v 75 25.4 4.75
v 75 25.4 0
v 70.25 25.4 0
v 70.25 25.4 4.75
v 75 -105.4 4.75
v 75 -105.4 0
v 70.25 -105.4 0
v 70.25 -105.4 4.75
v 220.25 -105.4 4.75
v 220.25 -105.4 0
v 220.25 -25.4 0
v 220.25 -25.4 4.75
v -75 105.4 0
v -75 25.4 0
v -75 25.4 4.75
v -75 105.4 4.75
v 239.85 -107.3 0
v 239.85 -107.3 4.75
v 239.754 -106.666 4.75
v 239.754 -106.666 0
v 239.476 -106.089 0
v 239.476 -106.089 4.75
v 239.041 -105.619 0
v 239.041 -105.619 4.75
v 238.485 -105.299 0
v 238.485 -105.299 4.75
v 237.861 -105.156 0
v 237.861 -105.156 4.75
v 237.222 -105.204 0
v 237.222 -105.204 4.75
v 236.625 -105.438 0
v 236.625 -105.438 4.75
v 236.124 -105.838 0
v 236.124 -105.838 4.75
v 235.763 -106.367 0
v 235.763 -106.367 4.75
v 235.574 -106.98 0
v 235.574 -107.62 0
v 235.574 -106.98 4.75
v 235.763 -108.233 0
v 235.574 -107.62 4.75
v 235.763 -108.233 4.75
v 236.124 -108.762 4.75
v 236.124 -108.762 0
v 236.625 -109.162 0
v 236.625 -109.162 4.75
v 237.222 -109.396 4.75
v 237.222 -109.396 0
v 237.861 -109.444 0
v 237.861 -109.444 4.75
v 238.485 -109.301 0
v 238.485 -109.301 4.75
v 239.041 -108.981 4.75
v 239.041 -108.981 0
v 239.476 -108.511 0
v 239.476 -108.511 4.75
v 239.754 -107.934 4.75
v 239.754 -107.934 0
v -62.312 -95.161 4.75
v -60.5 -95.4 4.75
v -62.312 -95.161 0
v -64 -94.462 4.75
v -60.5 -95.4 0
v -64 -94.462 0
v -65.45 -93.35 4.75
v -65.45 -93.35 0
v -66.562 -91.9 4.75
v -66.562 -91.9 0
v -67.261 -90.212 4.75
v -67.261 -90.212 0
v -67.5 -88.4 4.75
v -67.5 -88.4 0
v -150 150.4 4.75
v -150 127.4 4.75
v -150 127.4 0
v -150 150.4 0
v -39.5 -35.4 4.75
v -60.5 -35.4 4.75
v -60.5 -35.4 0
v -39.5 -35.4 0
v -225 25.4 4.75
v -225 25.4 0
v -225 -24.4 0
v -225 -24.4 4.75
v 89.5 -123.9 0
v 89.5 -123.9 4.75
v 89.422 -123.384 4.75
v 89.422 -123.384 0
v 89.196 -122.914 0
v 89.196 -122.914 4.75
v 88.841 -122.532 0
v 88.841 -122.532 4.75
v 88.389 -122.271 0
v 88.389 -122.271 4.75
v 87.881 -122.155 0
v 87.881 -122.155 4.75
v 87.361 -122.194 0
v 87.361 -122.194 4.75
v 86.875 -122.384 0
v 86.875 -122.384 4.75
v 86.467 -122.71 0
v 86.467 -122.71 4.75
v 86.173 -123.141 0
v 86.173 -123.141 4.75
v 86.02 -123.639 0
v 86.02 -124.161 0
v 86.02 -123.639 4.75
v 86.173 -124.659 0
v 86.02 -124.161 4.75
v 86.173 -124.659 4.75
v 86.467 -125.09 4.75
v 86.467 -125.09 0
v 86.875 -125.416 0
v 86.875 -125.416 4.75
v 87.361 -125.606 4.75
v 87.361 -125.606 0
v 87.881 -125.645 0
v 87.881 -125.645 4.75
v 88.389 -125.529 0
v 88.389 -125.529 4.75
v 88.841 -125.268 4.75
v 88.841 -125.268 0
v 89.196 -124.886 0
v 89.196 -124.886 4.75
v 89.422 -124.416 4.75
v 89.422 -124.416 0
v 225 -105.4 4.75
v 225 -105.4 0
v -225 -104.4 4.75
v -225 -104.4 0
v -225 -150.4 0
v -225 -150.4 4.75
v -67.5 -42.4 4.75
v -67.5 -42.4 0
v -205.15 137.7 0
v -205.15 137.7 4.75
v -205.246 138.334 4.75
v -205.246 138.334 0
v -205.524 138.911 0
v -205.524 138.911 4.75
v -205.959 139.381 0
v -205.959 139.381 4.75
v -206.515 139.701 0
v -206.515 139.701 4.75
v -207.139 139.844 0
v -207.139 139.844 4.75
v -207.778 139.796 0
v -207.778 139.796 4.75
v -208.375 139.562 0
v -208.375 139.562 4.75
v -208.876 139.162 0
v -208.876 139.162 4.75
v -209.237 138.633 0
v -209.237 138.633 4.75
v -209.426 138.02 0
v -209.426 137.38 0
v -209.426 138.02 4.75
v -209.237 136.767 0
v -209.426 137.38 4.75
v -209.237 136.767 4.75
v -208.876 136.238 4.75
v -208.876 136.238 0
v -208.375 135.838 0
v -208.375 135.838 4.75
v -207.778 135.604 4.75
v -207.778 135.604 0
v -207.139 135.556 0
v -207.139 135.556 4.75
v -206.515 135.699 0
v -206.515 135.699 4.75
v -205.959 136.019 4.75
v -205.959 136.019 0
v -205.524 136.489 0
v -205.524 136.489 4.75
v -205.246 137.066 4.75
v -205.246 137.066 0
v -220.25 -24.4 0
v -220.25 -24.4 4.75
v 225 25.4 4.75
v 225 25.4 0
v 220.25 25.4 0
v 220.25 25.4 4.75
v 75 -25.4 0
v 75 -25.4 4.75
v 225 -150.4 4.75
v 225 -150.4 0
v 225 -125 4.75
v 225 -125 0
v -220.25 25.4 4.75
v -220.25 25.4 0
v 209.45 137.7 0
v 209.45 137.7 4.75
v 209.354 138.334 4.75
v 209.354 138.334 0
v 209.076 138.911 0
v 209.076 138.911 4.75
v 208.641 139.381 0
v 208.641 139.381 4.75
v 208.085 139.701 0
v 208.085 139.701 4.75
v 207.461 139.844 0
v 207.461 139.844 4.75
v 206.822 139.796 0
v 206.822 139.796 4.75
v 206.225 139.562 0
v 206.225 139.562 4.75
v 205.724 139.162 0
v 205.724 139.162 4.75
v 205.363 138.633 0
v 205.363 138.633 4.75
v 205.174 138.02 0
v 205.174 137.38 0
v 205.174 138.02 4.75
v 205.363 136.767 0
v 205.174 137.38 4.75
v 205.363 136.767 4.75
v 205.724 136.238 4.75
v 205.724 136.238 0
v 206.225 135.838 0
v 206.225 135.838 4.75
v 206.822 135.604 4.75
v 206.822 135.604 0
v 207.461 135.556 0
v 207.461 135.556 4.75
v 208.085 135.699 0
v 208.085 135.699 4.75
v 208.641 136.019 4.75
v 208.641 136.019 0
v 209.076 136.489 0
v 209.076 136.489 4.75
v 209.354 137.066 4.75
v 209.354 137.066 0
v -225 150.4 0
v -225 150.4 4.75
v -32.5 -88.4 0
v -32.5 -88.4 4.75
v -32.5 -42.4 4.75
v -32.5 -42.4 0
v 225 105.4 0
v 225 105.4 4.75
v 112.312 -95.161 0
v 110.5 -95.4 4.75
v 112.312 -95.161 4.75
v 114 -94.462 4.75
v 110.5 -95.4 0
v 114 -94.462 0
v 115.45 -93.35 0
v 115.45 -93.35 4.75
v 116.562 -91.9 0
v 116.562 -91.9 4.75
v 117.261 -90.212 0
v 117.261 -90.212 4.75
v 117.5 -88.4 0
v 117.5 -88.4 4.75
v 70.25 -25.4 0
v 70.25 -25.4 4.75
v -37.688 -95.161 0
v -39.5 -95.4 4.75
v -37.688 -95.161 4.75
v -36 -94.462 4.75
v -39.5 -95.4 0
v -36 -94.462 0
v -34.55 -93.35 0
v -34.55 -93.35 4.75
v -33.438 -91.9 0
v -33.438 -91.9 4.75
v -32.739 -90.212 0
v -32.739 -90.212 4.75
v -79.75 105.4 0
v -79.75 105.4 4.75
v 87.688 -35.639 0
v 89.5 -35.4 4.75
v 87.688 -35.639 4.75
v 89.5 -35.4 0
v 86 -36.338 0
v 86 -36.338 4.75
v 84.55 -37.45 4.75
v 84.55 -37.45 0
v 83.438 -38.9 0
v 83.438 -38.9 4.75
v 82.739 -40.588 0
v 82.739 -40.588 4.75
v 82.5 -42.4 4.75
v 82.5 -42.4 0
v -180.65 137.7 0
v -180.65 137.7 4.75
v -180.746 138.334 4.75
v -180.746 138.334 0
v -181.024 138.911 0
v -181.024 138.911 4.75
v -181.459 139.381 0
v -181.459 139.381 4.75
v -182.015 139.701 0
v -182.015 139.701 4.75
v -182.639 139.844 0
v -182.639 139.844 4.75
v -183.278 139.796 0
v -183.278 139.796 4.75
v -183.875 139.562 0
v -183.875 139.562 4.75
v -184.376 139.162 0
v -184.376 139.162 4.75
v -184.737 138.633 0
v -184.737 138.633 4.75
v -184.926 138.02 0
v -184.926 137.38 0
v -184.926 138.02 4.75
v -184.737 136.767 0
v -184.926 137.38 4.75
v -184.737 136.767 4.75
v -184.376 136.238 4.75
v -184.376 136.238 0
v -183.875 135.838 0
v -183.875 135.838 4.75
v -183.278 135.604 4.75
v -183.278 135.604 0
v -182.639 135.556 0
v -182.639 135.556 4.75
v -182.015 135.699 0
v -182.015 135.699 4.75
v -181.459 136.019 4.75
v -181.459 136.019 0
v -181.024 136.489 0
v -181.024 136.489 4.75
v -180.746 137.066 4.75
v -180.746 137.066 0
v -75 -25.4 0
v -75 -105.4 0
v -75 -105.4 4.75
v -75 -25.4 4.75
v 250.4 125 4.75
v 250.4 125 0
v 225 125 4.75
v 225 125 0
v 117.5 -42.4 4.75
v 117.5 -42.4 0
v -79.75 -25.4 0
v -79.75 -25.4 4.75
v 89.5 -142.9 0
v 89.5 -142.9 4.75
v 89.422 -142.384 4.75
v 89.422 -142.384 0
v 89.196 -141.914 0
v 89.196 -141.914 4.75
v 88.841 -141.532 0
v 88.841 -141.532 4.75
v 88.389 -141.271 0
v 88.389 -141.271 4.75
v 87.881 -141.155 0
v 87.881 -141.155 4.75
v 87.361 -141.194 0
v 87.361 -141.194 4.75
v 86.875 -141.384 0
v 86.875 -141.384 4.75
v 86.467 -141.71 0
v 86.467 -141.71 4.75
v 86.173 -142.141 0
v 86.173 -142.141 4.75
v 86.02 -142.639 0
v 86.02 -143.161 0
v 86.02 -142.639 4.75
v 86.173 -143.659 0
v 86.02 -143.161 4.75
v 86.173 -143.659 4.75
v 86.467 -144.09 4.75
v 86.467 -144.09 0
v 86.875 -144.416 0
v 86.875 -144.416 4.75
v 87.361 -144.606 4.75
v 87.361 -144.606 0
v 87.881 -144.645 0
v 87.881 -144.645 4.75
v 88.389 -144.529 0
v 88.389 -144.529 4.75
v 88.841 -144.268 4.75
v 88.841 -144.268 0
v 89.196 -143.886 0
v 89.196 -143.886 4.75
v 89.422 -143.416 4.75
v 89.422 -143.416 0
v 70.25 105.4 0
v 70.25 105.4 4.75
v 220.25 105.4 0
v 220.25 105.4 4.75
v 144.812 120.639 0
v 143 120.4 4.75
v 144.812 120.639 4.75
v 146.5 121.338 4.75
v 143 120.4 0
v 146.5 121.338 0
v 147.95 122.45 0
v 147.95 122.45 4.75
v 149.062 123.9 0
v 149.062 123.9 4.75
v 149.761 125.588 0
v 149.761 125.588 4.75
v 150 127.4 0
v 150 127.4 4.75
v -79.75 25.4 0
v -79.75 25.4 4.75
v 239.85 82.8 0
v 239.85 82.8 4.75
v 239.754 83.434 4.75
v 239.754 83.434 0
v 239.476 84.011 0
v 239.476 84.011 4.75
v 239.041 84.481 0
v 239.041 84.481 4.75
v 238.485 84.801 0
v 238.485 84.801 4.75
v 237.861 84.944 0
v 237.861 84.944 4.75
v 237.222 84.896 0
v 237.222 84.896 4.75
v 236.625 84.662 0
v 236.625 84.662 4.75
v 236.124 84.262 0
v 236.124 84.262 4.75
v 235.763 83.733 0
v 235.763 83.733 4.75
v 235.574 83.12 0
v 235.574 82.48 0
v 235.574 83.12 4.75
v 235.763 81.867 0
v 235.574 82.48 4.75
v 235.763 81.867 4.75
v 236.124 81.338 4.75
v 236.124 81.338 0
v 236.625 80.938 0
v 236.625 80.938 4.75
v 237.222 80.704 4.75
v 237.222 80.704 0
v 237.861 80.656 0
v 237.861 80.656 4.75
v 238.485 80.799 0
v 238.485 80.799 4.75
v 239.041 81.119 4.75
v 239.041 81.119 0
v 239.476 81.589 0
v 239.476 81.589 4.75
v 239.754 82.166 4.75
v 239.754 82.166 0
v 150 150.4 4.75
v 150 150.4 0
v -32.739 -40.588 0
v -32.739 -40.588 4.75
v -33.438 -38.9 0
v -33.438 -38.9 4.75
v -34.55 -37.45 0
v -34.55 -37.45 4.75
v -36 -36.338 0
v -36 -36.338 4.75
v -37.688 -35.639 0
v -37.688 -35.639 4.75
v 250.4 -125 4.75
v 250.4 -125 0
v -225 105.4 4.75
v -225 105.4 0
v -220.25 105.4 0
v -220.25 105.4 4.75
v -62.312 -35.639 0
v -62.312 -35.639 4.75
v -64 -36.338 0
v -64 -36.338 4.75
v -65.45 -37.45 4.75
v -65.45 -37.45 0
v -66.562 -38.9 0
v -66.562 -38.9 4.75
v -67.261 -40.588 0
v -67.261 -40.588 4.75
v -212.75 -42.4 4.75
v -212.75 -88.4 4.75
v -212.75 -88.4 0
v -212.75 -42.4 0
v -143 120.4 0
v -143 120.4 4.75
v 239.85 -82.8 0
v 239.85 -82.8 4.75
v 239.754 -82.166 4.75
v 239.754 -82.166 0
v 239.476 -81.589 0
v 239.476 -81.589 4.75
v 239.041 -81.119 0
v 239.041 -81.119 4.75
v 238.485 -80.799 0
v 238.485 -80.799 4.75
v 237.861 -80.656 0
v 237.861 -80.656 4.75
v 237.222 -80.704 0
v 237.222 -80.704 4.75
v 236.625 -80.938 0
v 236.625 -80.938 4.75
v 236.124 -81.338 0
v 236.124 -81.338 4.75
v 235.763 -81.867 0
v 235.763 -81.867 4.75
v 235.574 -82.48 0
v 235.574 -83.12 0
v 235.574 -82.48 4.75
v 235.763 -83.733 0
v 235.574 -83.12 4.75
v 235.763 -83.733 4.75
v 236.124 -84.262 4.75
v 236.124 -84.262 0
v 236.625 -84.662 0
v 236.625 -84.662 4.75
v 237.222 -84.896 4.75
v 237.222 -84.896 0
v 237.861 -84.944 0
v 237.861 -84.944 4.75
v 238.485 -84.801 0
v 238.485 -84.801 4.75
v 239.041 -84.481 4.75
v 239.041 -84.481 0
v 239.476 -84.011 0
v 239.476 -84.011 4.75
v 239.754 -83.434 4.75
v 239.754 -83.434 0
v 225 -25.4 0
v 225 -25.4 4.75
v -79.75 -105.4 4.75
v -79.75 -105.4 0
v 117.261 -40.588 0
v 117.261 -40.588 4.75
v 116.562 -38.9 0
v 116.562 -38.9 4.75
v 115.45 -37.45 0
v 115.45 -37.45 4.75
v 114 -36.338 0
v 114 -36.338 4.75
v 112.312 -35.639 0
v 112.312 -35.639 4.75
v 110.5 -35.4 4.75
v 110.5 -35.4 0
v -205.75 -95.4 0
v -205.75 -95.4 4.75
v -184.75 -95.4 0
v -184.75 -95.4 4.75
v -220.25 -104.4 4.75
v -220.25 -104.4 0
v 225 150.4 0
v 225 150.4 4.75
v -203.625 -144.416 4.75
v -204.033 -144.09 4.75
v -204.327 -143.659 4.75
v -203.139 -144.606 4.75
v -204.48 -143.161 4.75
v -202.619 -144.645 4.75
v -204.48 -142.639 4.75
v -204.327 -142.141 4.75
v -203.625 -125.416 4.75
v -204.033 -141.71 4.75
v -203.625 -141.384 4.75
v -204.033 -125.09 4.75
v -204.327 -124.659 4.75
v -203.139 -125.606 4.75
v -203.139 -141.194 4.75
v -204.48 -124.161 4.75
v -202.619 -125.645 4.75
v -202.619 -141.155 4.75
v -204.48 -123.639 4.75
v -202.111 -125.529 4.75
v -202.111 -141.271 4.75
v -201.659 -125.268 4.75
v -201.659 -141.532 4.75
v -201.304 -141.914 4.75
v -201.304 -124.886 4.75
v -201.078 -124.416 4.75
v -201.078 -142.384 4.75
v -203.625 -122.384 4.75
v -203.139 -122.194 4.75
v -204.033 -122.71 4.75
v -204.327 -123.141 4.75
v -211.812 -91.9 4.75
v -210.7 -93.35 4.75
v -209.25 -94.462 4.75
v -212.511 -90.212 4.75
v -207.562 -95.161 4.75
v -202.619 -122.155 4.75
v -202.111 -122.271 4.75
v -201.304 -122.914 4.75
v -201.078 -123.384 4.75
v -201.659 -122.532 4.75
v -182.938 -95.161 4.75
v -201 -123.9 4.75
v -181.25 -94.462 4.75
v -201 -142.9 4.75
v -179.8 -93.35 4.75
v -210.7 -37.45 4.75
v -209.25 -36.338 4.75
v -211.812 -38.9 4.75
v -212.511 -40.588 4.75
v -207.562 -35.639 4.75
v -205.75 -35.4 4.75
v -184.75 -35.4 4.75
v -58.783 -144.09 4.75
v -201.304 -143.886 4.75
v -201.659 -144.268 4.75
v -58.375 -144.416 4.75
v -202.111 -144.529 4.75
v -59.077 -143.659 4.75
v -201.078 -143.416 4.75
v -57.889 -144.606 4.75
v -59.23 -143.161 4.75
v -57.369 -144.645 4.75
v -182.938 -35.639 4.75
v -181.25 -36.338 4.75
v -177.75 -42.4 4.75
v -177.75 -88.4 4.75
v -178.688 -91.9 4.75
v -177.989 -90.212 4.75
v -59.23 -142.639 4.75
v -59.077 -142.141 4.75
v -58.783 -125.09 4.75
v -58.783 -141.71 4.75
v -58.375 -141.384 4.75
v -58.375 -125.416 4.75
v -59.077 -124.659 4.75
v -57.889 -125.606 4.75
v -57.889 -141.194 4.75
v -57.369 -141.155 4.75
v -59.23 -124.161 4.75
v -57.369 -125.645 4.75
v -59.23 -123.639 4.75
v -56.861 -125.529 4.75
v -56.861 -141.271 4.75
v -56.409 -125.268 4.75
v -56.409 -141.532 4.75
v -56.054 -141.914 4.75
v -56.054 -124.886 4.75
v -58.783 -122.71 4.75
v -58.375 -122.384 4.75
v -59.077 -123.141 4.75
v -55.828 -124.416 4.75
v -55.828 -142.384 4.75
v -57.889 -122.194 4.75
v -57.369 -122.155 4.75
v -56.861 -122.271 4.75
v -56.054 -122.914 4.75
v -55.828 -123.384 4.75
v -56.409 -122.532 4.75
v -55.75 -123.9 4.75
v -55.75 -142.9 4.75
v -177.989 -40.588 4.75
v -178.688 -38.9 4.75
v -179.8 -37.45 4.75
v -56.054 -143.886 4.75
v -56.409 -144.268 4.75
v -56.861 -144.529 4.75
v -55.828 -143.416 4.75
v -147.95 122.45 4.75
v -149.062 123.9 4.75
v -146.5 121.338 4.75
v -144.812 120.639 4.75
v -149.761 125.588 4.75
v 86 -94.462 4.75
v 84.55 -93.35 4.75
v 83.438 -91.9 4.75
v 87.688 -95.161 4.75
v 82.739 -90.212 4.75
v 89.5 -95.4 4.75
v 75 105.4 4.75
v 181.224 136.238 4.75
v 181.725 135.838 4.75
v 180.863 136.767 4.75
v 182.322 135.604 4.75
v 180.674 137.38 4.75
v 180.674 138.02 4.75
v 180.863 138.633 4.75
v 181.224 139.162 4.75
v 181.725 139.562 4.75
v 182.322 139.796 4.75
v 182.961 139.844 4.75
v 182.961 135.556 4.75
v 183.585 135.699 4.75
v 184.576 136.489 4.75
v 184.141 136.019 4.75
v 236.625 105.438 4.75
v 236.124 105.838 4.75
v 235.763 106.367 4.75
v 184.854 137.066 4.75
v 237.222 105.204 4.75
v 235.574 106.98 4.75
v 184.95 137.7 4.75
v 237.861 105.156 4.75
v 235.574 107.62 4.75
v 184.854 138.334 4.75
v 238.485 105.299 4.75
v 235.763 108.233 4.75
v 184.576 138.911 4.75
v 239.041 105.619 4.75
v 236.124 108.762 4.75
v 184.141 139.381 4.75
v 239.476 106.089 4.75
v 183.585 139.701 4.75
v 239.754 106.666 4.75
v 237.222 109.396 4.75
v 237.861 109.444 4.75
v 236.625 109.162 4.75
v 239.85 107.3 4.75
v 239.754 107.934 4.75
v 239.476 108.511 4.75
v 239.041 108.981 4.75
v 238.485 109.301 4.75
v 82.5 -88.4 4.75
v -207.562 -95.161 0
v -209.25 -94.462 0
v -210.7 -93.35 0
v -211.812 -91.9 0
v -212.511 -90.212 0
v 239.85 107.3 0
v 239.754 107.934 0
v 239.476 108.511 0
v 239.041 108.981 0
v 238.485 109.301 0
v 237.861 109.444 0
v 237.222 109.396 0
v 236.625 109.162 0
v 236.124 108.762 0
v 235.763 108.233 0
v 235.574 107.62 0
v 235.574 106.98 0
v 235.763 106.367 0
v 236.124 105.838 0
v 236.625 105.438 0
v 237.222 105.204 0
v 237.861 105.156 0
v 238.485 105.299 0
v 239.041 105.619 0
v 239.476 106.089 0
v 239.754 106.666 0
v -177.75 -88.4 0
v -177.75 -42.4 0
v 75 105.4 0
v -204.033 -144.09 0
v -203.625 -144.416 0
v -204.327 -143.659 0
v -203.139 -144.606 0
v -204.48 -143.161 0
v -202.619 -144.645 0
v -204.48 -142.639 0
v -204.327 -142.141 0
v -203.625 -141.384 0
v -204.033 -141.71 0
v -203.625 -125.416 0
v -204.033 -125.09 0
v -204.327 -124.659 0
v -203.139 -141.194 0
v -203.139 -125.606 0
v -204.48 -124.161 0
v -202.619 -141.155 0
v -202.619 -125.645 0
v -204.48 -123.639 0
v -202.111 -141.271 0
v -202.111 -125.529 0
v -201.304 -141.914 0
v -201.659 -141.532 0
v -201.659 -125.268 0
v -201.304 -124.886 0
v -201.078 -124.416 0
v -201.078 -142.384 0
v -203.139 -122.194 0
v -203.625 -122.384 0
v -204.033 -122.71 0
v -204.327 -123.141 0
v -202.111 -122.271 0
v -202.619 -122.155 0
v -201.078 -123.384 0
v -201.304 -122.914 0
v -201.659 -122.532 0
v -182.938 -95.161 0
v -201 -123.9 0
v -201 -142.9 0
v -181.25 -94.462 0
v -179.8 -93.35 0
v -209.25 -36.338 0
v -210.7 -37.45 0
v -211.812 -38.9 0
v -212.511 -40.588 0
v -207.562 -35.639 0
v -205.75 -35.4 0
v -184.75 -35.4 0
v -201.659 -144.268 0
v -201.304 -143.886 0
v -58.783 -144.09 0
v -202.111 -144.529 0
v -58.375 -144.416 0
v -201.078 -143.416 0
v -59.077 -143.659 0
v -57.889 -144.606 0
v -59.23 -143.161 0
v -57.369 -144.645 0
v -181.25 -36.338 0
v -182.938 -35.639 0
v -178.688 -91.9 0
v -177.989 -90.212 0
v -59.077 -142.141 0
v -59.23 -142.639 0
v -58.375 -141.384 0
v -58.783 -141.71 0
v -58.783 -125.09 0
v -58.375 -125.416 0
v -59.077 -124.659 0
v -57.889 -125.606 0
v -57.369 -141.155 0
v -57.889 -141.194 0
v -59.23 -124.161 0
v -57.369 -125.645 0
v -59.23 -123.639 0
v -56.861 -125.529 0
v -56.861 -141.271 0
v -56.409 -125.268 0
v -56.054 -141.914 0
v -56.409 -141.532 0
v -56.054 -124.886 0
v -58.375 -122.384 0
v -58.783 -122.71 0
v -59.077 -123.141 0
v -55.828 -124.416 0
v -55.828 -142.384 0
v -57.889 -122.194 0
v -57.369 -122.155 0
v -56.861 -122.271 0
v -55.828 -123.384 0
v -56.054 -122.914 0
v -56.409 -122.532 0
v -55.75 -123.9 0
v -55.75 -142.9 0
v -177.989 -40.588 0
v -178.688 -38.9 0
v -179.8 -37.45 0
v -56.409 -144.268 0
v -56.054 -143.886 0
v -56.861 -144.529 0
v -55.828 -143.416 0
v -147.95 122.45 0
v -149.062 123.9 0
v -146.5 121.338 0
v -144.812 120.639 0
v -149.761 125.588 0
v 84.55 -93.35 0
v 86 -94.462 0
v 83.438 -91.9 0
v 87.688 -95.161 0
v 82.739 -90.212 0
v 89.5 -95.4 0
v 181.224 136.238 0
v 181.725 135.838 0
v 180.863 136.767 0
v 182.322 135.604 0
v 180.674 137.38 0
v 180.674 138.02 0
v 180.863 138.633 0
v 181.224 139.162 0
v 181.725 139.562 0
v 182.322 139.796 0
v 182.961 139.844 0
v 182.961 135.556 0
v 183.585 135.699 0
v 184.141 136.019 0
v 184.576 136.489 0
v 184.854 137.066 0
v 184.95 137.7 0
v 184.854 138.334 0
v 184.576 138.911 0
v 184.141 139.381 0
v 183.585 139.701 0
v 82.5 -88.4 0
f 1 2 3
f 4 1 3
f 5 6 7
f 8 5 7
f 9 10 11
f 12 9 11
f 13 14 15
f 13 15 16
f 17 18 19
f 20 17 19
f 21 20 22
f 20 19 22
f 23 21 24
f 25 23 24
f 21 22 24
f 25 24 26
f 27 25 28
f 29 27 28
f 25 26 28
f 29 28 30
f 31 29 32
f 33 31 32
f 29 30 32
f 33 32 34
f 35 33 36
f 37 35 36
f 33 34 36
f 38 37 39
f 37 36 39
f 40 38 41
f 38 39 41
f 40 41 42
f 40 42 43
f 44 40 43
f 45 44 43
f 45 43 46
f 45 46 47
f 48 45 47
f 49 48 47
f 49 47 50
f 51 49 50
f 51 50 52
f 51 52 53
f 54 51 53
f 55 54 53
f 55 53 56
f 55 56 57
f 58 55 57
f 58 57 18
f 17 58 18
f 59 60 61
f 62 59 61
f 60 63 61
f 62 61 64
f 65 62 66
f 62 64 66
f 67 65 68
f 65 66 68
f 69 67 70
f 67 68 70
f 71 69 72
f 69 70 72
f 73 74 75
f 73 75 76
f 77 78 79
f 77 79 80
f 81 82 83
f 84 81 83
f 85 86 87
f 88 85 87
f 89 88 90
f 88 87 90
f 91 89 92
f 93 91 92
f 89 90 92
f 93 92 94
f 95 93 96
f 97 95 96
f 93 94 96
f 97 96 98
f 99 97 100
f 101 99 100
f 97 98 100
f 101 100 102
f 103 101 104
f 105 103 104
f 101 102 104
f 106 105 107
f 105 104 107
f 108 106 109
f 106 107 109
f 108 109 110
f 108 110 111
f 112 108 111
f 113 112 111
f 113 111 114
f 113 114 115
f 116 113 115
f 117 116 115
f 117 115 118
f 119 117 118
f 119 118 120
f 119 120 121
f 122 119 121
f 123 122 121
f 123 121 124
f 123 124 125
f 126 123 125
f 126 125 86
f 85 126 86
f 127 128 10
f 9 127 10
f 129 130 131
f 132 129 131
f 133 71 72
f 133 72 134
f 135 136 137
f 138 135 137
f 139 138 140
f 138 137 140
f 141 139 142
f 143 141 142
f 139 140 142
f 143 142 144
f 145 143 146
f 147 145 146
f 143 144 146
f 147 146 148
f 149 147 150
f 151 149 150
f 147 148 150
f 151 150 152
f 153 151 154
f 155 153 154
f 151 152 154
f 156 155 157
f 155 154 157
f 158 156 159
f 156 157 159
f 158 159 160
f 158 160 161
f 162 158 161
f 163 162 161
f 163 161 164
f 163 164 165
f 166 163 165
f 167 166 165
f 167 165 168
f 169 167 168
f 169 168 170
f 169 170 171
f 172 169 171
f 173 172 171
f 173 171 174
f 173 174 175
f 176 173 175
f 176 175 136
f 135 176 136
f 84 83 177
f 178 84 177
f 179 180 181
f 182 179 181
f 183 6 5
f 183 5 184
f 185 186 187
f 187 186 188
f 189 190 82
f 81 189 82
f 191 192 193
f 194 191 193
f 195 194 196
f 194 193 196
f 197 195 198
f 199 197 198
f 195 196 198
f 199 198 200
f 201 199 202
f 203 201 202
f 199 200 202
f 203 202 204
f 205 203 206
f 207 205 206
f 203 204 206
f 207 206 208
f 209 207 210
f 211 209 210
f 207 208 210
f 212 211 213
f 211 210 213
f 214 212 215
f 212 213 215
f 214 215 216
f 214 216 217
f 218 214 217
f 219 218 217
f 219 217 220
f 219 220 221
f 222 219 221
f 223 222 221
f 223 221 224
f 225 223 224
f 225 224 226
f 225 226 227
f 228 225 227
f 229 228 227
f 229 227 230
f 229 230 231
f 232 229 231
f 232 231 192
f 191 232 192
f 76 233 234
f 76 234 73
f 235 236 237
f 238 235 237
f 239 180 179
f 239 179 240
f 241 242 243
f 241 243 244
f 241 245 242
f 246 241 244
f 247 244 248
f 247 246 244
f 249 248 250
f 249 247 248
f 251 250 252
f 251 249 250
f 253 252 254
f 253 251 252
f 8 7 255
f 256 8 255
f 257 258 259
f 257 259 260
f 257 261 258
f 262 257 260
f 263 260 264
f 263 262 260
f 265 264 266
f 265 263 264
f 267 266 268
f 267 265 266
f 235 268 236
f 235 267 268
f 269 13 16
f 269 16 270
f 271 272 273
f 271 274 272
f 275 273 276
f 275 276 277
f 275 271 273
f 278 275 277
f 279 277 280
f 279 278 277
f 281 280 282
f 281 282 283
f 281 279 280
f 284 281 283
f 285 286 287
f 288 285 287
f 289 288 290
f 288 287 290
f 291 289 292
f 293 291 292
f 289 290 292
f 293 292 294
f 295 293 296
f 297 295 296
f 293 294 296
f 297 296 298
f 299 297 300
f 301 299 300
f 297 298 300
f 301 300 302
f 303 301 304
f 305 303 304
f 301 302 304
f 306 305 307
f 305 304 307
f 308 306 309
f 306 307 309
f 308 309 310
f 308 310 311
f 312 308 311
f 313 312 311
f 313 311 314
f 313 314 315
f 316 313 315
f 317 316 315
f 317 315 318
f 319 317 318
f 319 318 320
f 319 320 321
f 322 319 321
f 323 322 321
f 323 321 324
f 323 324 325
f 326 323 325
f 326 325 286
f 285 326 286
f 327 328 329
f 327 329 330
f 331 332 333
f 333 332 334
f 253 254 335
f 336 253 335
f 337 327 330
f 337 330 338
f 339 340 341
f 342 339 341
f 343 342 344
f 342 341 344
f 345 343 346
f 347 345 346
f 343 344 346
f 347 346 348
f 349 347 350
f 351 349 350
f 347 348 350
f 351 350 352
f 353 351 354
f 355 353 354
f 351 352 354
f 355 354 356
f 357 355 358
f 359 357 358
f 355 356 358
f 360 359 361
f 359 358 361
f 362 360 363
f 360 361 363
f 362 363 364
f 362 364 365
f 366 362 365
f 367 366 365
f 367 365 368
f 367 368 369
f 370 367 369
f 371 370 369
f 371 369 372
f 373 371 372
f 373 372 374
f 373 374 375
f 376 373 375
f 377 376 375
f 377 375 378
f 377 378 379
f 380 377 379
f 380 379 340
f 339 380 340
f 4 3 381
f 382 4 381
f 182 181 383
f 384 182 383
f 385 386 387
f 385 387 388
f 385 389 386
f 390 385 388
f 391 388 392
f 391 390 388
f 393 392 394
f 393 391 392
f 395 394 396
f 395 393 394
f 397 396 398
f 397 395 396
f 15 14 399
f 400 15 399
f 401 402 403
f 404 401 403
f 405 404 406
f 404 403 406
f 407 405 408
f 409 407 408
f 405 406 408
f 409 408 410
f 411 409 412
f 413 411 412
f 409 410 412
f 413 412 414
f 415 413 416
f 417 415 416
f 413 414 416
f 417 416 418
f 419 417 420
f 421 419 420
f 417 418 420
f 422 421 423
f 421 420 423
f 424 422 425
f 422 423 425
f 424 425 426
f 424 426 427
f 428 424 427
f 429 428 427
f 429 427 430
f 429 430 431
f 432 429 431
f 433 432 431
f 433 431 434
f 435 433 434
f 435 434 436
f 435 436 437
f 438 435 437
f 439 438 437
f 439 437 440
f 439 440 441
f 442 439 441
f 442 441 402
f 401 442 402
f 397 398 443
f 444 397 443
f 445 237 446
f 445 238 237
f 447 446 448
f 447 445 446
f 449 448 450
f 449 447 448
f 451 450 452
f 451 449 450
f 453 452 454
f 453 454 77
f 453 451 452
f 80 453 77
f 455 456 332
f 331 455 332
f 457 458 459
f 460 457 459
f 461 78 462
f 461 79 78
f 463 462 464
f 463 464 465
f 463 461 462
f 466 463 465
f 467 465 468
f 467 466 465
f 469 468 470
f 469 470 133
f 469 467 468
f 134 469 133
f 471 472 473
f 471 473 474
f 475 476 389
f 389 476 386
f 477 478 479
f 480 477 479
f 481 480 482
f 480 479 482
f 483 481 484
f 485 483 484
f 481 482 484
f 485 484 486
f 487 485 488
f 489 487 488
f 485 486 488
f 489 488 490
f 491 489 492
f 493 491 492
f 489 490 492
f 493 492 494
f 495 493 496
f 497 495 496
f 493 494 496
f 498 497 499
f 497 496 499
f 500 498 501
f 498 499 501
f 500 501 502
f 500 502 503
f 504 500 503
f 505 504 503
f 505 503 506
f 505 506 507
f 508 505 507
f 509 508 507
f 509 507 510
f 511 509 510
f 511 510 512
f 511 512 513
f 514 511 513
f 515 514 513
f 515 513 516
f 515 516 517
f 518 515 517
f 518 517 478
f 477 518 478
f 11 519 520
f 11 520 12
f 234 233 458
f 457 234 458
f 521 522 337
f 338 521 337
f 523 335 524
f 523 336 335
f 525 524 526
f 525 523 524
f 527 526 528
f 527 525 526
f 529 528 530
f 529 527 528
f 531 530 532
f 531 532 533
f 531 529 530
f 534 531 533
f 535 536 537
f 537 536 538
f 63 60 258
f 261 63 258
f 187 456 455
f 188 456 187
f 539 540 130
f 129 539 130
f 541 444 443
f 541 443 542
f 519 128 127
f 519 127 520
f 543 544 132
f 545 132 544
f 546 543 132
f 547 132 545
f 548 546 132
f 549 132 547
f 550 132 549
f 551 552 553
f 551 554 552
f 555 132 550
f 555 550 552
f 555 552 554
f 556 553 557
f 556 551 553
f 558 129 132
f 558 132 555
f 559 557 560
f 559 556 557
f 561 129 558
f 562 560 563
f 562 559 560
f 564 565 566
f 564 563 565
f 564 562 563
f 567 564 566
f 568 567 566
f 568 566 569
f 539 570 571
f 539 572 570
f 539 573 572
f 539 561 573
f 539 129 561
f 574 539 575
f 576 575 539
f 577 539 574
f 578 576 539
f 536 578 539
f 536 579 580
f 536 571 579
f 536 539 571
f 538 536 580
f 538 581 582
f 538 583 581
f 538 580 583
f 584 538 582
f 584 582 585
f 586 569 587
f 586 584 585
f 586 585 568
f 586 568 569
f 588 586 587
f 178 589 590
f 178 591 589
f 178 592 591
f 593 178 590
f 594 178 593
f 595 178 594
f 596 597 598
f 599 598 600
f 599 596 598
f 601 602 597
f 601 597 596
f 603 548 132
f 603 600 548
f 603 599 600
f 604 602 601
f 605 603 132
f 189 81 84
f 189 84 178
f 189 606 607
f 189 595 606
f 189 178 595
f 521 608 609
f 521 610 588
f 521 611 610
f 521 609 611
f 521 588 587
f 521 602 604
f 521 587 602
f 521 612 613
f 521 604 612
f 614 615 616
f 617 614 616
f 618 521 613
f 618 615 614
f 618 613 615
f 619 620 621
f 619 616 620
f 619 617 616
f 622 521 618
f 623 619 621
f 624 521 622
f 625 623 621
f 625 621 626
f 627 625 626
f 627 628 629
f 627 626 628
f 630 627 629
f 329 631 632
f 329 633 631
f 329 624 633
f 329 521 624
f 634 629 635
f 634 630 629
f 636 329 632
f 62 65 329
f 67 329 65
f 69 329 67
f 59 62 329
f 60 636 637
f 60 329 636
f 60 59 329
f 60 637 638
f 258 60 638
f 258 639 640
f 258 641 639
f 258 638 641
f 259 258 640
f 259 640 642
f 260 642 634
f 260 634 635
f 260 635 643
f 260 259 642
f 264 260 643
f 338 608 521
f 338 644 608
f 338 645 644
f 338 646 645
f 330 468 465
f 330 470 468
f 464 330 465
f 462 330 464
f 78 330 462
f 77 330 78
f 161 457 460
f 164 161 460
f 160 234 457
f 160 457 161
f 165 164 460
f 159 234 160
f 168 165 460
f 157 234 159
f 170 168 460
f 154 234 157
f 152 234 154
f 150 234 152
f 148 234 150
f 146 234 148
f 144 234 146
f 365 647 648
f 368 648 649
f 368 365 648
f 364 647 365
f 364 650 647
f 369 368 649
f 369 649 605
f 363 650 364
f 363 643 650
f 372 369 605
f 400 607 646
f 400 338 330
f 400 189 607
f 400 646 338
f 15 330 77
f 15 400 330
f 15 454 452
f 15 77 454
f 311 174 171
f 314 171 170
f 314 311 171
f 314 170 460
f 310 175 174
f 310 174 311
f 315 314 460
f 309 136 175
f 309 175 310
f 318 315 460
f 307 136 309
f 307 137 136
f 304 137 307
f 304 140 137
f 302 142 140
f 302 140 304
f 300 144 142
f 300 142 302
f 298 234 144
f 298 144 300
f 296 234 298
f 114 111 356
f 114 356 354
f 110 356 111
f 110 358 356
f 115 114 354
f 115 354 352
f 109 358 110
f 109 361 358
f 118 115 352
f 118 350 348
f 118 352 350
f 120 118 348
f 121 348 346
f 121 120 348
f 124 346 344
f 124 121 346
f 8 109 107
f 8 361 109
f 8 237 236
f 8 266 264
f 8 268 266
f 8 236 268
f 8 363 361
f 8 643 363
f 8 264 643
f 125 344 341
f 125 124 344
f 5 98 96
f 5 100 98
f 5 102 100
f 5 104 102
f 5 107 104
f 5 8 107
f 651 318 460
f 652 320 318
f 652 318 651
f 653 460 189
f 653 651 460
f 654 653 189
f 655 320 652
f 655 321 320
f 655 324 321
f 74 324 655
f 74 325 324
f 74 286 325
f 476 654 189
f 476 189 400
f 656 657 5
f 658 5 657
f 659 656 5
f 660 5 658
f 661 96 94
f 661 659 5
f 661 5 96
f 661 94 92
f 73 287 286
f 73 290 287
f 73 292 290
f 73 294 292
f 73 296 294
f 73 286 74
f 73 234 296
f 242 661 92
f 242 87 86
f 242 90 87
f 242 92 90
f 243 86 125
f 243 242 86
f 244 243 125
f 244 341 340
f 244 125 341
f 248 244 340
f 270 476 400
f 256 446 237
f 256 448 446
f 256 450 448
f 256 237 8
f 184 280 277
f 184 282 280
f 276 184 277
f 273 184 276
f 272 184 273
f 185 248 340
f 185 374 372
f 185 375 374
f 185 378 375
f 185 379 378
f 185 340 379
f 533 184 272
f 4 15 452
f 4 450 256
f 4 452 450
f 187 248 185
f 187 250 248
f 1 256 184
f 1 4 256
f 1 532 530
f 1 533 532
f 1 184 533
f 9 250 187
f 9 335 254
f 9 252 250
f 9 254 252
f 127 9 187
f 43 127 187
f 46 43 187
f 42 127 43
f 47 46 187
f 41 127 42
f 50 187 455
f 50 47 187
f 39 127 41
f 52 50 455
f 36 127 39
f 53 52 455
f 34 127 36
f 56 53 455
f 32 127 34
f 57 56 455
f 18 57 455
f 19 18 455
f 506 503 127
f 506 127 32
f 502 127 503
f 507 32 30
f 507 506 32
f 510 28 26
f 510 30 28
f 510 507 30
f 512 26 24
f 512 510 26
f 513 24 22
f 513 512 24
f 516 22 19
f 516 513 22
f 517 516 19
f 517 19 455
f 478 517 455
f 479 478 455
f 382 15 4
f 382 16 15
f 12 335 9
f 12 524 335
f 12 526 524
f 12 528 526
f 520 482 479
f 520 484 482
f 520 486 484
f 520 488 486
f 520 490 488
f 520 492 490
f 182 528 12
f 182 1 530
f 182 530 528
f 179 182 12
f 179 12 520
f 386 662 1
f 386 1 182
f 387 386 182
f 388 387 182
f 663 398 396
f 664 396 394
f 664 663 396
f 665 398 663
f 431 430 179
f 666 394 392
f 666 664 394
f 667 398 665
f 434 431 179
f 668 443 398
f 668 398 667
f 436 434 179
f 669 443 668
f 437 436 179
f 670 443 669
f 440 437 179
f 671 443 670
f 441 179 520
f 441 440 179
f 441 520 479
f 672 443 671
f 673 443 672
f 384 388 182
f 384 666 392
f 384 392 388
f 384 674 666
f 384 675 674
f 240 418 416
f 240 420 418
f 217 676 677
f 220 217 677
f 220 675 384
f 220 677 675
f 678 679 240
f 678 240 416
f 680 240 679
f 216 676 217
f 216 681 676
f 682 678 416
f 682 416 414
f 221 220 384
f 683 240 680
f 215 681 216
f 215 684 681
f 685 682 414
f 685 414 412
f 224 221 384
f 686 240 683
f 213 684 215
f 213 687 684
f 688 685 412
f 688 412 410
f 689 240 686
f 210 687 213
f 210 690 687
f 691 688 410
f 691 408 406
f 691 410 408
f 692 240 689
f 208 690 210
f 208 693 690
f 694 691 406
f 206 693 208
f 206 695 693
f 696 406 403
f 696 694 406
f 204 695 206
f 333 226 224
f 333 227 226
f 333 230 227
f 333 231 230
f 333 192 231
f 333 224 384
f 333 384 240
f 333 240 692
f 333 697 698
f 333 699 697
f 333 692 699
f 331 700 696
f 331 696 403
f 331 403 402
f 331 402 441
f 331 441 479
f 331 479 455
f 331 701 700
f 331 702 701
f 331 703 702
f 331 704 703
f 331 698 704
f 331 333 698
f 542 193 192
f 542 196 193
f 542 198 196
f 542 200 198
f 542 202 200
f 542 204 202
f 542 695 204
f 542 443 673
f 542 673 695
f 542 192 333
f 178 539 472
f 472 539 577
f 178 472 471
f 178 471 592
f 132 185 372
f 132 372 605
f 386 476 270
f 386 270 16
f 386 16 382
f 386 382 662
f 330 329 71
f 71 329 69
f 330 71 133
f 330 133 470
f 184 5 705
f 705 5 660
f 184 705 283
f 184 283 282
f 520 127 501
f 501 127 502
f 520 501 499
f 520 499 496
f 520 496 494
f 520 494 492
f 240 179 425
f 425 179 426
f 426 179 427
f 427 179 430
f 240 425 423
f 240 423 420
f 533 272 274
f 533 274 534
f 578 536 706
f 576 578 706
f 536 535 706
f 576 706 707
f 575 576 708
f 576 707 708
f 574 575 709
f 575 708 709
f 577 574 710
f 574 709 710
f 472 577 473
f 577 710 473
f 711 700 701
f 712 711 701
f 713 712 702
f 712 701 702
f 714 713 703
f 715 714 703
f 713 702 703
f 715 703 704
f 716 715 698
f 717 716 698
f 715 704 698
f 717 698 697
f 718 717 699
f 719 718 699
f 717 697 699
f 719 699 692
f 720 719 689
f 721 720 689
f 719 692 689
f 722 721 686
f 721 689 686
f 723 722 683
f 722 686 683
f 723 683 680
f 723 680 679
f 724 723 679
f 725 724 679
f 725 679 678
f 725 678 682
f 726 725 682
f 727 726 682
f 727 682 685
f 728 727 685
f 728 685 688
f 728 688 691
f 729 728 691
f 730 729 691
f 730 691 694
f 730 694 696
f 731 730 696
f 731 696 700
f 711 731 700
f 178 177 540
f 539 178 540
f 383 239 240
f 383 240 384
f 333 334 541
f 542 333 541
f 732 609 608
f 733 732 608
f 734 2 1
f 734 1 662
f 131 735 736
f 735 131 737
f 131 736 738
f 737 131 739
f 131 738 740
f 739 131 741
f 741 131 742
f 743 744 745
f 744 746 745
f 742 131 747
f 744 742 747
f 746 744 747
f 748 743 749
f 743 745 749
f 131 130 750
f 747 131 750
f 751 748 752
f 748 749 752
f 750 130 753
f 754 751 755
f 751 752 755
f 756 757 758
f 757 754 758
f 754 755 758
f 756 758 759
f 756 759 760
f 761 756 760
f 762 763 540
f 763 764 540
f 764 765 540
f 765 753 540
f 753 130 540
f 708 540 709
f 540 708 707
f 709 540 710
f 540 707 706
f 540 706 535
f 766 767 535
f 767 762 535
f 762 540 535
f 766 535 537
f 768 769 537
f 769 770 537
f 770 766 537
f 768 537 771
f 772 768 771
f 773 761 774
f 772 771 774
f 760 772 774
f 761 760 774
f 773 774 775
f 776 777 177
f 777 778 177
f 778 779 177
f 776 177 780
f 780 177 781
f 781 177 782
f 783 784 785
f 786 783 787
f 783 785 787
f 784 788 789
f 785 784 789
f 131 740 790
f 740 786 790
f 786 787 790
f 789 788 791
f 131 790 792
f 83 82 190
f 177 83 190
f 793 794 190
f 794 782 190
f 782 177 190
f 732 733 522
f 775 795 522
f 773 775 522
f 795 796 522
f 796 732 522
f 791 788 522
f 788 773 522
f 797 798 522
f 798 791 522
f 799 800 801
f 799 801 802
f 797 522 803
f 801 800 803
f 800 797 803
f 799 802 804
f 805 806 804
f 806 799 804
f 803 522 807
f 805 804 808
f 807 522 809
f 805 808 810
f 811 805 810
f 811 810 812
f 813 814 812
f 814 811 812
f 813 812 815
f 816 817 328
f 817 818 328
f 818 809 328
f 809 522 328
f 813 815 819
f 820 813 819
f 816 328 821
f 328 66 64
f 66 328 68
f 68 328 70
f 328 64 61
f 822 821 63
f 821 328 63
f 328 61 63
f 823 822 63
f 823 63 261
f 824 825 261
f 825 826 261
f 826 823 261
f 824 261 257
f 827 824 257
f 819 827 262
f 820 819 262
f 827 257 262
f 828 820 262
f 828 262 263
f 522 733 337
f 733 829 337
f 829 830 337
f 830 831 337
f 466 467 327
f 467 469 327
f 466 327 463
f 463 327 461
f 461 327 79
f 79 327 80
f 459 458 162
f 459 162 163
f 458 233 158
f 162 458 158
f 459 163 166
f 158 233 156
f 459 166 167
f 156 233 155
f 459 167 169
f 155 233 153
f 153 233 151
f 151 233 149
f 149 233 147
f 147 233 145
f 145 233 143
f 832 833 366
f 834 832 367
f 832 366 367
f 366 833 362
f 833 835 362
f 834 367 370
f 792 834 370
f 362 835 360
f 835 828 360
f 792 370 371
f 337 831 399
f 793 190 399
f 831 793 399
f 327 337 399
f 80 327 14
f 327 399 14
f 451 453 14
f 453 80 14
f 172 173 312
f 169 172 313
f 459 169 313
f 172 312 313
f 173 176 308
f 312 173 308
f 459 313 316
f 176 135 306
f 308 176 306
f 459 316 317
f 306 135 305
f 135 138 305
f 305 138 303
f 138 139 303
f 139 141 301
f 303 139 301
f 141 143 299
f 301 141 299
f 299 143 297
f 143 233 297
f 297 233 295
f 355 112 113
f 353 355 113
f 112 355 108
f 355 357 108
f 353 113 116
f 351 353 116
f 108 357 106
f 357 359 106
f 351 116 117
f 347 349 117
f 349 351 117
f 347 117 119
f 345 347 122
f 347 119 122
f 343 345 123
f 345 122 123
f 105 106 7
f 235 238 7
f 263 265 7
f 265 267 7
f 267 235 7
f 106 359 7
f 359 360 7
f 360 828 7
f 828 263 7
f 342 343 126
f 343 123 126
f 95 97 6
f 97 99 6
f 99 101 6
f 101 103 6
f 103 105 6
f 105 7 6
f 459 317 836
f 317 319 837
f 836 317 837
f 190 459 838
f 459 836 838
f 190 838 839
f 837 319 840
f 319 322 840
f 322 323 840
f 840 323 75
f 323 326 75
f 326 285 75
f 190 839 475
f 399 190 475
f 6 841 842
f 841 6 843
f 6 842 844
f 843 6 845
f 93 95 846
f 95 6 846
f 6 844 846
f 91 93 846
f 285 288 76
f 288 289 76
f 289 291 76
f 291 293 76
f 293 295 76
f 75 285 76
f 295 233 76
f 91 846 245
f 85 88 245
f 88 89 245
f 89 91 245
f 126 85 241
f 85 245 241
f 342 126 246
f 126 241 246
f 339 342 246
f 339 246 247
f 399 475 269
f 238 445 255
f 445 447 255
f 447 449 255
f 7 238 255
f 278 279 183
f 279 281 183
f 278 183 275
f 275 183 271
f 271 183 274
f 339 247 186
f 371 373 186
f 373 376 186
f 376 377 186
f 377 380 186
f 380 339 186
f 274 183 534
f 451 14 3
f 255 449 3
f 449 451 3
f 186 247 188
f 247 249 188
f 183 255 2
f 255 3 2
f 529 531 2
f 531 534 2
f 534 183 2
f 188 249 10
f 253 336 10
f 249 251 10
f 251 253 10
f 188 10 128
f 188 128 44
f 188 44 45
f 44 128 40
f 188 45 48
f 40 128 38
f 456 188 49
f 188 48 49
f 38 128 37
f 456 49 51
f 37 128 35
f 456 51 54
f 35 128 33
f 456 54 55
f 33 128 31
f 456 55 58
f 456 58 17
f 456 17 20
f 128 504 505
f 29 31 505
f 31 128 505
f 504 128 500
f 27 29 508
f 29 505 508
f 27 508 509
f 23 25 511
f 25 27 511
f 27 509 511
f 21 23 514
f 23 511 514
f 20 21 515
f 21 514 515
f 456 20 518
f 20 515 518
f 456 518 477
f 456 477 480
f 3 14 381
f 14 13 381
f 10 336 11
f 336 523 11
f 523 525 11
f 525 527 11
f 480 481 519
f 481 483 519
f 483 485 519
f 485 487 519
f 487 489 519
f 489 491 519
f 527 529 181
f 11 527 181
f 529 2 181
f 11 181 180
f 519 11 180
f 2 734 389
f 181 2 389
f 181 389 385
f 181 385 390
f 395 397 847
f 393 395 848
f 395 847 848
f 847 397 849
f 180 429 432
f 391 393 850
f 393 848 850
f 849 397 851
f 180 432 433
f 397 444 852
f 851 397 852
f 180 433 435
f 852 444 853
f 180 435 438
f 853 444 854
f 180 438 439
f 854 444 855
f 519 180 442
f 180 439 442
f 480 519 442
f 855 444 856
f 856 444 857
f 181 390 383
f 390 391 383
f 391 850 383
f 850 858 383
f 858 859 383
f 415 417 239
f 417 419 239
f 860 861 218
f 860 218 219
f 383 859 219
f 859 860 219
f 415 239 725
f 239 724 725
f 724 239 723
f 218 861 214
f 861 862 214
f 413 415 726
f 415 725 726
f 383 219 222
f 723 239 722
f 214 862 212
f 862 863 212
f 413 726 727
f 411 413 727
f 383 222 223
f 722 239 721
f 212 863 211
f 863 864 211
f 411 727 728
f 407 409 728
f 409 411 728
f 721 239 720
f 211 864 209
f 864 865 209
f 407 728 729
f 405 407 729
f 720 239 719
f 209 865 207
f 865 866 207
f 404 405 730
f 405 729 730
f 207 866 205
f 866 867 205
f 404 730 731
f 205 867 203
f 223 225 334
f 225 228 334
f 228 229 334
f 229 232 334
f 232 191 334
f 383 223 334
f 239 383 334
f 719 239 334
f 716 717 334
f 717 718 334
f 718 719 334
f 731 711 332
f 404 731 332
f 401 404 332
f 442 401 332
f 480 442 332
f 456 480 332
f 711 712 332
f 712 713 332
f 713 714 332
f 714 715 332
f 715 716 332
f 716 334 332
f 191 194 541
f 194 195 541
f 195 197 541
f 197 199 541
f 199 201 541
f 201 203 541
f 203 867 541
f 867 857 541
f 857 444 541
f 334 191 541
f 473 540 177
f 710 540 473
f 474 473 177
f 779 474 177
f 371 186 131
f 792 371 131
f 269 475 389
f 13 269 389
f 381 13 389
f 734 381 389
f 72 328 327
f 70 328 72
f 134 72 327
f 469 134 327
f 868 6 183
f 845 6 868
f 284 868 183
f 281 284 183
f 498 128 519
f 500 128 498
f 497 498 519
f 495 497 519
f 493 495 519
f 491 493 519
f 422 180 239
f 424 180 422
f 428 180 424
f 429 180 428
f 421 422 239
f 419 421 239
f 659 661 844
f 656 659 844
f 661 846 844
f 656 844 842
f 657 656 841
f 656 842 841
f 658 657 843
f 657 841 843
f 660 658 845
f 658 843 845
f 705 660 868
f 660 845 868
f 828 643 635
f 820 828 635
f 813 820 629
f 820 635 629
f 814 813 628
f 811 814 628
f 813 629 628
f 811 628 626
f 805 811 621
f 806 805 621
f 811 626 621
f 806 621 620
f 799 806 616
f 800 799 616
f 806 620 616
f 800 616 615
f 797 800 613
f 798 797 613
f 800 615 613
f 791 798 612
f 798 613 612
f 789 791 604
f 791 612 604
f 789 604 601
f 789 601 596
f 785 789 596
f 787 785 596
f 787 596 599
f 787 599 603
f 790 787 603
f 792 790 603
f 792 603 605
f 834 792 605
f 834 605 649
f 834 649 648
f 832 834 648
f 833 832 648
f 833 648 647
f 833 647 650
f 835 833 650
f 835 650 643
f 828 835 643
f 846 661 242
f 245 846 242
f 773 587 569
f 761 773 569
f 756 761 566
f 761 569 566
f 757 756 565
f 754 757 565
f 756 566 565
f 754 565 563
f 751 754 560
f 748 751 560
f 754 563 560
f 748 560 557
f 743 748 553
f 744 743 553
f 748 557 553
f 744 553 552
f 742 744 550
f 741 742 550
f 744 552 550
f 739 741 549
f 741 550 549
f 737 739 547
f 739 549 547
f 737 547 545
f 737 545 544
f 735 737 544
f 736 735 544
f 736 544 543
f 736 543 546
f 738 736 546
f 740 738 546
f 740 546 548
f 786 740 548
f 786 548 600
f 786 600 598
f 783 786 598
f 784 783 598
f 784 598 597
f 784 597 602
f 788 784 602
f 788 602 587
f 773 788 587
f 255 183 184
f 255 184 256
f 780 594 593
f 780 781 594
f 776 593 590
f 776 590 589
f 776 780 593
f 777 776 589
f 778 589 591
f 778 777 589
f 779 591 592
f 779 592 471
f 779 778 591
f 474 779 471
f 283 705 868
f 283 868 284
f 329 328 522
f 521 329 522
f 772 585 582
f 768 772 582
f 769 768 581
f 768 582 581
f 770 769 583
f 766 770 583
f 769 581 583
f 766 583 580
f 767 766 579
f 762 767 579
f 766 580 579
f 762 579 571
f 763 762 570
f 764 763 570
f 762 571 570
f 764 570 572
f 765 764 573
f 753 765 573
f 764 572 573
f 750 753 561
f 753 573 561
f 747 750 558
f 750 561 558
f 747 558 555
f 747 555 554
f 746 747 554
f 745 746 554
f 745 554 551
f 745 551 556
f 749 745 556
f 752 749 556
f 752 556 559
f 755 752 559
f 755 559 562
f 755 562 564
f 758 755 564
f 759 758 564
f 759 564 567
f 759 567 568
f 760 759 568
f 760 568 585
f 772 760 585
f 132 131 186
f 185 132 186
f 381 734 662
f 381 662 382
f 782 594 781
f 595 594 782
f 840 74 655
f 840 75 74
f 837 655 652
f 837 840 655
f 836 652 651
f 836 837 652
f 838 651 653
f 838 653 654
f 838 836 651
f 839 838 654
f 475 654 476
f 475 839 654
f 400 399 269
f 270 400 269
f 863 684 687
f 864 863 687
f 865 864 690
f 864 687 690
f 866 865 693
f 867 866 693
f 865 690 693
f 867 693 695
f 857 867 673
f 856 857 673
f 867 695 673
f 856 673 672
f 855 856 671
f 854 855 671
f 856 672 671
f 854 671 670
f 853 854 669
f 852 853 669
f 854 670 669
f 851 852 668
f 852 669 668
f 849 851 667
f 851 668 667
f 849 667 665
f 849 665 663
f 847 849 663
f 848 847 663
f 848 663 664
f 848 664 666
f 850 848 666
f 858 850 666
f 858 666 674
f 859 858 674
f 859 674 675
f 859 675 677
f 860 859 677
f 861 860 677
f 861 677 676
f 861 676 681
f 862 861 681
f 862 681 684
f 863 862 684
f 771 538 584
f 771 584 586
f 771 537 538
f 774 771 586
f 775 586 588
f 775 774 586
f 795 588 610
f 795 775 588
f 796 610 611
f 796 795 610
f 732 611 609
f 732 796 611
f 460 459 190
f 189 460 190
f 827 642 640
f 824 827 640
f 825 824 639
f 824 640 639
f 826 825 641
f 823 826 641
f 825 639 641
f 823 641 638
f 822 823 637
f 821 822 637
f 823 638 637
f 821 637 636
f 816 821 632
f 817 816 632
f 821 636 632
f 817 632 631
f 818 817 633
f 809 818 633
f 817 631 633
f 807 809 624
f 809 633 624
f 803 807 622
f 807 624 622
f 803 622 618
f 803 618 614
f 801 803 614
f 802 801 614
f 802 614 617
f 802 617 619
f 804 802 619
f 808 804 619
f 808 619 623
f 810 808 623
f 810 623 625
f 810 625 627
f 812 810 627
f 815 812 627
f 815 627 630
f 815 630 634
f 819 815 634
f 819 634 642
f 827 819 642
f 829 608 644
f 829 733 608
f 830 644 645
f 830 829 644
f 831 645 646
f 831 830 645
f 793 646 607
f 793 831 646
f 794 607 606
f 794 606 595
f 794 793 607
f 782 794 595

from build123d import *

# Parameters (mm, degrees)
SKETCH_1_W          = 500.8
SKETCH_1_H          = 300.8
EXTRUDE_1_DEPTH     = 4.75
SKETCH_2_W          = 25.4
SKETCH_2_H          = 25.4
SKETCH_2_W_2        = 4.75
SKETCH_2_H_2        = 80
CUT_EXTRUDE_1_DEPTH = 25.4
SKETCH_3_R          = 2.15
SKETCH_3_R_2        = 2.150000004
CUT_EXTRUDE_2_DEPTH = 5
SKETCH_5_W          = 35
SKETCH_5_H          = 60
SKETCH_5_W_2        = 300
SKETCH_5_H_2        = 30
CUT_EXTRUDE_3_DEPTH = 10
FILLET_1_R          = 7
SKETCH_6_R          = 1.75
CUT_EXTRUDE_4_DEPTH = 10


with BuildPart() as part:
    # 草圖1 → 填料-伸長1 (new body)
    with BuildSketch(Plane.XY):
        Rectangle(SKETCH_1_W, SKETCH_1_H)
    extrude(amount=EXTRUDE_1_DEPTH)

    # 草圖2 → 除料-伸長1 (cut)
    with BuildSketch(Plane(origin=(0, 0, 0), x_dir=(-1, 0, 0), z_dir=(0, 0, -1))):
        with Locations((-237.7, 137.7)):
            Rectangle(SKETCH_2_W, SKETCH_2_H)
        with Locations((-237.7, -137.7)):
            Rectangle(SKETCH_2_W, SKETCH_2_H)
        Polygon((250.4, -150.4), (250.4, 150.4), (225, 150.4), (225, 105.4), (220.25, 105.4), (220.25, 25.4), (225, 25.4), (225, -24.4), (220.25, -24.4), (220.25, -104.4), (225, -104.4), (225, -150.4), align=None)
        with Locations((-222.625, 65.4)):
            Rectangle(SKETCH_2_W_2, SKETCH_2_H_2)
        with Locations((-222.625, -65.4)):
            Rectangle(SKETCH_2_W_2, SKETCH_2_H_2)
        with Locations((-72.625, 65.4)):
            Rectangle(SKETCH_2_W_2, SKETCH_2_H_2)
        with Locations((77.375, 65.4)):
            Rectangle(SKETCH_2_W_2, SKETCH_2_H_2)
        with Locations((77.375, -65.4)):
            Rectangle(SKETCH_2_W_2, SKETCH_2_H_2)
        with Locations((-72.625, -65.4)):
            Rectangle(SKETCH_2_W_2, SKETCH_2_H_2)
    extrude(amount=-CUT_EXTRUDE_1_DEPTH, mode=Mode.SUBTRACT)

    # 草圖3 → 除料-伸長2 (cut)
    with BuildSketch(Plane.XY.offset(4.75)):
        with Locations((-207.3, 137.7)):
            Circle(SKETCH_3_R)
        with Locations((-182.8, 137.7)):
            Circle(SKETCH_3_R)
        with Locations((182.8, 137.7)):
            Circle(SKETCH_3_R)
        with Locations((207.3, 137.7)):
            Circle(SKETCH_3_R)
        with Locations((237.7, 107.3)):
            Circle(SKETCH_3_R)
        with Locations((237.7, 82.8)):
            Circle(SKETCH_3_R)
        with Locations((237.7, -82.800000014)):
            Circle(SKETCH_3_R_2)
        with Locations((237.7, -107.300000014)):
            Circle(SKETCH_3_R_2)
        with Locations((-237.7, 107.3)):
            Circle(SKETCH_3_R)
        with Locations((-237.7, 82.8)):
            Circle(SKETCH_3_R)
        with Locations((-237.7, -82.800000014)):
            Circle(SKETCH_3_R_2)
        with Locations((-237.7, -107.300000014)):
            Circle(SKETCH_3_R_2)
    extrude(amount=-CUT_EXTRUDE_2_DEPTH, mode=Mode.SUBTRACT)

    # 草圖5 → 除料-伸長3 (cut)
    with BuildSketch(Plane.XY.offset(4.75)):
        with Locations((100, -65.4)):
            Rectangle(SKETCH_5_W, SKETCH_5_H)
        with Locations((-50, -65.4)):
            Rectangle(SKETCH_5_W, SKETCH_5_H)
        with Locations((-195.25, -65.4)):
            Rectangle(SKETCH_5_W, SKETCH_5_H)
        with Locations((0, 135.4)):
            Rectangle(SKETCH_5_W_2, SKETCH_5_H_2)
    extrude(amount=-CUT_EXTRUDE_3_DEPTH, mode=Mode.SUBTRACT)

    # 圓角1
    fillet_1_edges = [part.edges().sort_by_distance(p)[0] for p in [
        (-150, 120.4, 2.375),
        (150, 120.4, 2.375),
        (-177.75, -35.4, 2.375),
        (-177.75, -95.4, 2.375),
        (-212.75, -95.4, 2.375),
        (-212.75, -35.4, 2.375),
        (-32.5, -35.4, 2.375),
        (-32.5, -95.4, 2.375),
        (-67.5, -95.4, 2.375),
        (-67.5, -35.4, 2.375),
        (117.5, -35.4, 2.375),
        (117.5, -95.4, 2.375),
        (82.5, -95.4, 2.375),
        (82.5, -35.4, 2.375),
    ]]
    fillet(fillet_1_edges, radius=FILLET_1_R)

    # 草圖6 → 除料-伸長4 (cut)
    with BuildSketch(Plane.XY.offset(4.75)):
        with Locations((-202.75, -142.9)):
            Circle(SKETCH_6_R)
        with Locations((-202.75, -123.9)):
            Circle(SKETCH_6_R)
        with Locations((-57.5, -142.9)):
            Circle(SKETCH_6_R)
        with Locations((-57.5, -123.9)):
            Circle(SKETCH_6_R)
        with Locations((87.75, -142.9)):
            Circle(SKETCH_6_R)
        with Locations((87.75, -123.9)):
            Circle(SKETCH_6_R)
    extrude(amount=-CUT_EXTRUDE_4_DEPTH, mode=Mode.SUBTRACT)


solid = part.part
